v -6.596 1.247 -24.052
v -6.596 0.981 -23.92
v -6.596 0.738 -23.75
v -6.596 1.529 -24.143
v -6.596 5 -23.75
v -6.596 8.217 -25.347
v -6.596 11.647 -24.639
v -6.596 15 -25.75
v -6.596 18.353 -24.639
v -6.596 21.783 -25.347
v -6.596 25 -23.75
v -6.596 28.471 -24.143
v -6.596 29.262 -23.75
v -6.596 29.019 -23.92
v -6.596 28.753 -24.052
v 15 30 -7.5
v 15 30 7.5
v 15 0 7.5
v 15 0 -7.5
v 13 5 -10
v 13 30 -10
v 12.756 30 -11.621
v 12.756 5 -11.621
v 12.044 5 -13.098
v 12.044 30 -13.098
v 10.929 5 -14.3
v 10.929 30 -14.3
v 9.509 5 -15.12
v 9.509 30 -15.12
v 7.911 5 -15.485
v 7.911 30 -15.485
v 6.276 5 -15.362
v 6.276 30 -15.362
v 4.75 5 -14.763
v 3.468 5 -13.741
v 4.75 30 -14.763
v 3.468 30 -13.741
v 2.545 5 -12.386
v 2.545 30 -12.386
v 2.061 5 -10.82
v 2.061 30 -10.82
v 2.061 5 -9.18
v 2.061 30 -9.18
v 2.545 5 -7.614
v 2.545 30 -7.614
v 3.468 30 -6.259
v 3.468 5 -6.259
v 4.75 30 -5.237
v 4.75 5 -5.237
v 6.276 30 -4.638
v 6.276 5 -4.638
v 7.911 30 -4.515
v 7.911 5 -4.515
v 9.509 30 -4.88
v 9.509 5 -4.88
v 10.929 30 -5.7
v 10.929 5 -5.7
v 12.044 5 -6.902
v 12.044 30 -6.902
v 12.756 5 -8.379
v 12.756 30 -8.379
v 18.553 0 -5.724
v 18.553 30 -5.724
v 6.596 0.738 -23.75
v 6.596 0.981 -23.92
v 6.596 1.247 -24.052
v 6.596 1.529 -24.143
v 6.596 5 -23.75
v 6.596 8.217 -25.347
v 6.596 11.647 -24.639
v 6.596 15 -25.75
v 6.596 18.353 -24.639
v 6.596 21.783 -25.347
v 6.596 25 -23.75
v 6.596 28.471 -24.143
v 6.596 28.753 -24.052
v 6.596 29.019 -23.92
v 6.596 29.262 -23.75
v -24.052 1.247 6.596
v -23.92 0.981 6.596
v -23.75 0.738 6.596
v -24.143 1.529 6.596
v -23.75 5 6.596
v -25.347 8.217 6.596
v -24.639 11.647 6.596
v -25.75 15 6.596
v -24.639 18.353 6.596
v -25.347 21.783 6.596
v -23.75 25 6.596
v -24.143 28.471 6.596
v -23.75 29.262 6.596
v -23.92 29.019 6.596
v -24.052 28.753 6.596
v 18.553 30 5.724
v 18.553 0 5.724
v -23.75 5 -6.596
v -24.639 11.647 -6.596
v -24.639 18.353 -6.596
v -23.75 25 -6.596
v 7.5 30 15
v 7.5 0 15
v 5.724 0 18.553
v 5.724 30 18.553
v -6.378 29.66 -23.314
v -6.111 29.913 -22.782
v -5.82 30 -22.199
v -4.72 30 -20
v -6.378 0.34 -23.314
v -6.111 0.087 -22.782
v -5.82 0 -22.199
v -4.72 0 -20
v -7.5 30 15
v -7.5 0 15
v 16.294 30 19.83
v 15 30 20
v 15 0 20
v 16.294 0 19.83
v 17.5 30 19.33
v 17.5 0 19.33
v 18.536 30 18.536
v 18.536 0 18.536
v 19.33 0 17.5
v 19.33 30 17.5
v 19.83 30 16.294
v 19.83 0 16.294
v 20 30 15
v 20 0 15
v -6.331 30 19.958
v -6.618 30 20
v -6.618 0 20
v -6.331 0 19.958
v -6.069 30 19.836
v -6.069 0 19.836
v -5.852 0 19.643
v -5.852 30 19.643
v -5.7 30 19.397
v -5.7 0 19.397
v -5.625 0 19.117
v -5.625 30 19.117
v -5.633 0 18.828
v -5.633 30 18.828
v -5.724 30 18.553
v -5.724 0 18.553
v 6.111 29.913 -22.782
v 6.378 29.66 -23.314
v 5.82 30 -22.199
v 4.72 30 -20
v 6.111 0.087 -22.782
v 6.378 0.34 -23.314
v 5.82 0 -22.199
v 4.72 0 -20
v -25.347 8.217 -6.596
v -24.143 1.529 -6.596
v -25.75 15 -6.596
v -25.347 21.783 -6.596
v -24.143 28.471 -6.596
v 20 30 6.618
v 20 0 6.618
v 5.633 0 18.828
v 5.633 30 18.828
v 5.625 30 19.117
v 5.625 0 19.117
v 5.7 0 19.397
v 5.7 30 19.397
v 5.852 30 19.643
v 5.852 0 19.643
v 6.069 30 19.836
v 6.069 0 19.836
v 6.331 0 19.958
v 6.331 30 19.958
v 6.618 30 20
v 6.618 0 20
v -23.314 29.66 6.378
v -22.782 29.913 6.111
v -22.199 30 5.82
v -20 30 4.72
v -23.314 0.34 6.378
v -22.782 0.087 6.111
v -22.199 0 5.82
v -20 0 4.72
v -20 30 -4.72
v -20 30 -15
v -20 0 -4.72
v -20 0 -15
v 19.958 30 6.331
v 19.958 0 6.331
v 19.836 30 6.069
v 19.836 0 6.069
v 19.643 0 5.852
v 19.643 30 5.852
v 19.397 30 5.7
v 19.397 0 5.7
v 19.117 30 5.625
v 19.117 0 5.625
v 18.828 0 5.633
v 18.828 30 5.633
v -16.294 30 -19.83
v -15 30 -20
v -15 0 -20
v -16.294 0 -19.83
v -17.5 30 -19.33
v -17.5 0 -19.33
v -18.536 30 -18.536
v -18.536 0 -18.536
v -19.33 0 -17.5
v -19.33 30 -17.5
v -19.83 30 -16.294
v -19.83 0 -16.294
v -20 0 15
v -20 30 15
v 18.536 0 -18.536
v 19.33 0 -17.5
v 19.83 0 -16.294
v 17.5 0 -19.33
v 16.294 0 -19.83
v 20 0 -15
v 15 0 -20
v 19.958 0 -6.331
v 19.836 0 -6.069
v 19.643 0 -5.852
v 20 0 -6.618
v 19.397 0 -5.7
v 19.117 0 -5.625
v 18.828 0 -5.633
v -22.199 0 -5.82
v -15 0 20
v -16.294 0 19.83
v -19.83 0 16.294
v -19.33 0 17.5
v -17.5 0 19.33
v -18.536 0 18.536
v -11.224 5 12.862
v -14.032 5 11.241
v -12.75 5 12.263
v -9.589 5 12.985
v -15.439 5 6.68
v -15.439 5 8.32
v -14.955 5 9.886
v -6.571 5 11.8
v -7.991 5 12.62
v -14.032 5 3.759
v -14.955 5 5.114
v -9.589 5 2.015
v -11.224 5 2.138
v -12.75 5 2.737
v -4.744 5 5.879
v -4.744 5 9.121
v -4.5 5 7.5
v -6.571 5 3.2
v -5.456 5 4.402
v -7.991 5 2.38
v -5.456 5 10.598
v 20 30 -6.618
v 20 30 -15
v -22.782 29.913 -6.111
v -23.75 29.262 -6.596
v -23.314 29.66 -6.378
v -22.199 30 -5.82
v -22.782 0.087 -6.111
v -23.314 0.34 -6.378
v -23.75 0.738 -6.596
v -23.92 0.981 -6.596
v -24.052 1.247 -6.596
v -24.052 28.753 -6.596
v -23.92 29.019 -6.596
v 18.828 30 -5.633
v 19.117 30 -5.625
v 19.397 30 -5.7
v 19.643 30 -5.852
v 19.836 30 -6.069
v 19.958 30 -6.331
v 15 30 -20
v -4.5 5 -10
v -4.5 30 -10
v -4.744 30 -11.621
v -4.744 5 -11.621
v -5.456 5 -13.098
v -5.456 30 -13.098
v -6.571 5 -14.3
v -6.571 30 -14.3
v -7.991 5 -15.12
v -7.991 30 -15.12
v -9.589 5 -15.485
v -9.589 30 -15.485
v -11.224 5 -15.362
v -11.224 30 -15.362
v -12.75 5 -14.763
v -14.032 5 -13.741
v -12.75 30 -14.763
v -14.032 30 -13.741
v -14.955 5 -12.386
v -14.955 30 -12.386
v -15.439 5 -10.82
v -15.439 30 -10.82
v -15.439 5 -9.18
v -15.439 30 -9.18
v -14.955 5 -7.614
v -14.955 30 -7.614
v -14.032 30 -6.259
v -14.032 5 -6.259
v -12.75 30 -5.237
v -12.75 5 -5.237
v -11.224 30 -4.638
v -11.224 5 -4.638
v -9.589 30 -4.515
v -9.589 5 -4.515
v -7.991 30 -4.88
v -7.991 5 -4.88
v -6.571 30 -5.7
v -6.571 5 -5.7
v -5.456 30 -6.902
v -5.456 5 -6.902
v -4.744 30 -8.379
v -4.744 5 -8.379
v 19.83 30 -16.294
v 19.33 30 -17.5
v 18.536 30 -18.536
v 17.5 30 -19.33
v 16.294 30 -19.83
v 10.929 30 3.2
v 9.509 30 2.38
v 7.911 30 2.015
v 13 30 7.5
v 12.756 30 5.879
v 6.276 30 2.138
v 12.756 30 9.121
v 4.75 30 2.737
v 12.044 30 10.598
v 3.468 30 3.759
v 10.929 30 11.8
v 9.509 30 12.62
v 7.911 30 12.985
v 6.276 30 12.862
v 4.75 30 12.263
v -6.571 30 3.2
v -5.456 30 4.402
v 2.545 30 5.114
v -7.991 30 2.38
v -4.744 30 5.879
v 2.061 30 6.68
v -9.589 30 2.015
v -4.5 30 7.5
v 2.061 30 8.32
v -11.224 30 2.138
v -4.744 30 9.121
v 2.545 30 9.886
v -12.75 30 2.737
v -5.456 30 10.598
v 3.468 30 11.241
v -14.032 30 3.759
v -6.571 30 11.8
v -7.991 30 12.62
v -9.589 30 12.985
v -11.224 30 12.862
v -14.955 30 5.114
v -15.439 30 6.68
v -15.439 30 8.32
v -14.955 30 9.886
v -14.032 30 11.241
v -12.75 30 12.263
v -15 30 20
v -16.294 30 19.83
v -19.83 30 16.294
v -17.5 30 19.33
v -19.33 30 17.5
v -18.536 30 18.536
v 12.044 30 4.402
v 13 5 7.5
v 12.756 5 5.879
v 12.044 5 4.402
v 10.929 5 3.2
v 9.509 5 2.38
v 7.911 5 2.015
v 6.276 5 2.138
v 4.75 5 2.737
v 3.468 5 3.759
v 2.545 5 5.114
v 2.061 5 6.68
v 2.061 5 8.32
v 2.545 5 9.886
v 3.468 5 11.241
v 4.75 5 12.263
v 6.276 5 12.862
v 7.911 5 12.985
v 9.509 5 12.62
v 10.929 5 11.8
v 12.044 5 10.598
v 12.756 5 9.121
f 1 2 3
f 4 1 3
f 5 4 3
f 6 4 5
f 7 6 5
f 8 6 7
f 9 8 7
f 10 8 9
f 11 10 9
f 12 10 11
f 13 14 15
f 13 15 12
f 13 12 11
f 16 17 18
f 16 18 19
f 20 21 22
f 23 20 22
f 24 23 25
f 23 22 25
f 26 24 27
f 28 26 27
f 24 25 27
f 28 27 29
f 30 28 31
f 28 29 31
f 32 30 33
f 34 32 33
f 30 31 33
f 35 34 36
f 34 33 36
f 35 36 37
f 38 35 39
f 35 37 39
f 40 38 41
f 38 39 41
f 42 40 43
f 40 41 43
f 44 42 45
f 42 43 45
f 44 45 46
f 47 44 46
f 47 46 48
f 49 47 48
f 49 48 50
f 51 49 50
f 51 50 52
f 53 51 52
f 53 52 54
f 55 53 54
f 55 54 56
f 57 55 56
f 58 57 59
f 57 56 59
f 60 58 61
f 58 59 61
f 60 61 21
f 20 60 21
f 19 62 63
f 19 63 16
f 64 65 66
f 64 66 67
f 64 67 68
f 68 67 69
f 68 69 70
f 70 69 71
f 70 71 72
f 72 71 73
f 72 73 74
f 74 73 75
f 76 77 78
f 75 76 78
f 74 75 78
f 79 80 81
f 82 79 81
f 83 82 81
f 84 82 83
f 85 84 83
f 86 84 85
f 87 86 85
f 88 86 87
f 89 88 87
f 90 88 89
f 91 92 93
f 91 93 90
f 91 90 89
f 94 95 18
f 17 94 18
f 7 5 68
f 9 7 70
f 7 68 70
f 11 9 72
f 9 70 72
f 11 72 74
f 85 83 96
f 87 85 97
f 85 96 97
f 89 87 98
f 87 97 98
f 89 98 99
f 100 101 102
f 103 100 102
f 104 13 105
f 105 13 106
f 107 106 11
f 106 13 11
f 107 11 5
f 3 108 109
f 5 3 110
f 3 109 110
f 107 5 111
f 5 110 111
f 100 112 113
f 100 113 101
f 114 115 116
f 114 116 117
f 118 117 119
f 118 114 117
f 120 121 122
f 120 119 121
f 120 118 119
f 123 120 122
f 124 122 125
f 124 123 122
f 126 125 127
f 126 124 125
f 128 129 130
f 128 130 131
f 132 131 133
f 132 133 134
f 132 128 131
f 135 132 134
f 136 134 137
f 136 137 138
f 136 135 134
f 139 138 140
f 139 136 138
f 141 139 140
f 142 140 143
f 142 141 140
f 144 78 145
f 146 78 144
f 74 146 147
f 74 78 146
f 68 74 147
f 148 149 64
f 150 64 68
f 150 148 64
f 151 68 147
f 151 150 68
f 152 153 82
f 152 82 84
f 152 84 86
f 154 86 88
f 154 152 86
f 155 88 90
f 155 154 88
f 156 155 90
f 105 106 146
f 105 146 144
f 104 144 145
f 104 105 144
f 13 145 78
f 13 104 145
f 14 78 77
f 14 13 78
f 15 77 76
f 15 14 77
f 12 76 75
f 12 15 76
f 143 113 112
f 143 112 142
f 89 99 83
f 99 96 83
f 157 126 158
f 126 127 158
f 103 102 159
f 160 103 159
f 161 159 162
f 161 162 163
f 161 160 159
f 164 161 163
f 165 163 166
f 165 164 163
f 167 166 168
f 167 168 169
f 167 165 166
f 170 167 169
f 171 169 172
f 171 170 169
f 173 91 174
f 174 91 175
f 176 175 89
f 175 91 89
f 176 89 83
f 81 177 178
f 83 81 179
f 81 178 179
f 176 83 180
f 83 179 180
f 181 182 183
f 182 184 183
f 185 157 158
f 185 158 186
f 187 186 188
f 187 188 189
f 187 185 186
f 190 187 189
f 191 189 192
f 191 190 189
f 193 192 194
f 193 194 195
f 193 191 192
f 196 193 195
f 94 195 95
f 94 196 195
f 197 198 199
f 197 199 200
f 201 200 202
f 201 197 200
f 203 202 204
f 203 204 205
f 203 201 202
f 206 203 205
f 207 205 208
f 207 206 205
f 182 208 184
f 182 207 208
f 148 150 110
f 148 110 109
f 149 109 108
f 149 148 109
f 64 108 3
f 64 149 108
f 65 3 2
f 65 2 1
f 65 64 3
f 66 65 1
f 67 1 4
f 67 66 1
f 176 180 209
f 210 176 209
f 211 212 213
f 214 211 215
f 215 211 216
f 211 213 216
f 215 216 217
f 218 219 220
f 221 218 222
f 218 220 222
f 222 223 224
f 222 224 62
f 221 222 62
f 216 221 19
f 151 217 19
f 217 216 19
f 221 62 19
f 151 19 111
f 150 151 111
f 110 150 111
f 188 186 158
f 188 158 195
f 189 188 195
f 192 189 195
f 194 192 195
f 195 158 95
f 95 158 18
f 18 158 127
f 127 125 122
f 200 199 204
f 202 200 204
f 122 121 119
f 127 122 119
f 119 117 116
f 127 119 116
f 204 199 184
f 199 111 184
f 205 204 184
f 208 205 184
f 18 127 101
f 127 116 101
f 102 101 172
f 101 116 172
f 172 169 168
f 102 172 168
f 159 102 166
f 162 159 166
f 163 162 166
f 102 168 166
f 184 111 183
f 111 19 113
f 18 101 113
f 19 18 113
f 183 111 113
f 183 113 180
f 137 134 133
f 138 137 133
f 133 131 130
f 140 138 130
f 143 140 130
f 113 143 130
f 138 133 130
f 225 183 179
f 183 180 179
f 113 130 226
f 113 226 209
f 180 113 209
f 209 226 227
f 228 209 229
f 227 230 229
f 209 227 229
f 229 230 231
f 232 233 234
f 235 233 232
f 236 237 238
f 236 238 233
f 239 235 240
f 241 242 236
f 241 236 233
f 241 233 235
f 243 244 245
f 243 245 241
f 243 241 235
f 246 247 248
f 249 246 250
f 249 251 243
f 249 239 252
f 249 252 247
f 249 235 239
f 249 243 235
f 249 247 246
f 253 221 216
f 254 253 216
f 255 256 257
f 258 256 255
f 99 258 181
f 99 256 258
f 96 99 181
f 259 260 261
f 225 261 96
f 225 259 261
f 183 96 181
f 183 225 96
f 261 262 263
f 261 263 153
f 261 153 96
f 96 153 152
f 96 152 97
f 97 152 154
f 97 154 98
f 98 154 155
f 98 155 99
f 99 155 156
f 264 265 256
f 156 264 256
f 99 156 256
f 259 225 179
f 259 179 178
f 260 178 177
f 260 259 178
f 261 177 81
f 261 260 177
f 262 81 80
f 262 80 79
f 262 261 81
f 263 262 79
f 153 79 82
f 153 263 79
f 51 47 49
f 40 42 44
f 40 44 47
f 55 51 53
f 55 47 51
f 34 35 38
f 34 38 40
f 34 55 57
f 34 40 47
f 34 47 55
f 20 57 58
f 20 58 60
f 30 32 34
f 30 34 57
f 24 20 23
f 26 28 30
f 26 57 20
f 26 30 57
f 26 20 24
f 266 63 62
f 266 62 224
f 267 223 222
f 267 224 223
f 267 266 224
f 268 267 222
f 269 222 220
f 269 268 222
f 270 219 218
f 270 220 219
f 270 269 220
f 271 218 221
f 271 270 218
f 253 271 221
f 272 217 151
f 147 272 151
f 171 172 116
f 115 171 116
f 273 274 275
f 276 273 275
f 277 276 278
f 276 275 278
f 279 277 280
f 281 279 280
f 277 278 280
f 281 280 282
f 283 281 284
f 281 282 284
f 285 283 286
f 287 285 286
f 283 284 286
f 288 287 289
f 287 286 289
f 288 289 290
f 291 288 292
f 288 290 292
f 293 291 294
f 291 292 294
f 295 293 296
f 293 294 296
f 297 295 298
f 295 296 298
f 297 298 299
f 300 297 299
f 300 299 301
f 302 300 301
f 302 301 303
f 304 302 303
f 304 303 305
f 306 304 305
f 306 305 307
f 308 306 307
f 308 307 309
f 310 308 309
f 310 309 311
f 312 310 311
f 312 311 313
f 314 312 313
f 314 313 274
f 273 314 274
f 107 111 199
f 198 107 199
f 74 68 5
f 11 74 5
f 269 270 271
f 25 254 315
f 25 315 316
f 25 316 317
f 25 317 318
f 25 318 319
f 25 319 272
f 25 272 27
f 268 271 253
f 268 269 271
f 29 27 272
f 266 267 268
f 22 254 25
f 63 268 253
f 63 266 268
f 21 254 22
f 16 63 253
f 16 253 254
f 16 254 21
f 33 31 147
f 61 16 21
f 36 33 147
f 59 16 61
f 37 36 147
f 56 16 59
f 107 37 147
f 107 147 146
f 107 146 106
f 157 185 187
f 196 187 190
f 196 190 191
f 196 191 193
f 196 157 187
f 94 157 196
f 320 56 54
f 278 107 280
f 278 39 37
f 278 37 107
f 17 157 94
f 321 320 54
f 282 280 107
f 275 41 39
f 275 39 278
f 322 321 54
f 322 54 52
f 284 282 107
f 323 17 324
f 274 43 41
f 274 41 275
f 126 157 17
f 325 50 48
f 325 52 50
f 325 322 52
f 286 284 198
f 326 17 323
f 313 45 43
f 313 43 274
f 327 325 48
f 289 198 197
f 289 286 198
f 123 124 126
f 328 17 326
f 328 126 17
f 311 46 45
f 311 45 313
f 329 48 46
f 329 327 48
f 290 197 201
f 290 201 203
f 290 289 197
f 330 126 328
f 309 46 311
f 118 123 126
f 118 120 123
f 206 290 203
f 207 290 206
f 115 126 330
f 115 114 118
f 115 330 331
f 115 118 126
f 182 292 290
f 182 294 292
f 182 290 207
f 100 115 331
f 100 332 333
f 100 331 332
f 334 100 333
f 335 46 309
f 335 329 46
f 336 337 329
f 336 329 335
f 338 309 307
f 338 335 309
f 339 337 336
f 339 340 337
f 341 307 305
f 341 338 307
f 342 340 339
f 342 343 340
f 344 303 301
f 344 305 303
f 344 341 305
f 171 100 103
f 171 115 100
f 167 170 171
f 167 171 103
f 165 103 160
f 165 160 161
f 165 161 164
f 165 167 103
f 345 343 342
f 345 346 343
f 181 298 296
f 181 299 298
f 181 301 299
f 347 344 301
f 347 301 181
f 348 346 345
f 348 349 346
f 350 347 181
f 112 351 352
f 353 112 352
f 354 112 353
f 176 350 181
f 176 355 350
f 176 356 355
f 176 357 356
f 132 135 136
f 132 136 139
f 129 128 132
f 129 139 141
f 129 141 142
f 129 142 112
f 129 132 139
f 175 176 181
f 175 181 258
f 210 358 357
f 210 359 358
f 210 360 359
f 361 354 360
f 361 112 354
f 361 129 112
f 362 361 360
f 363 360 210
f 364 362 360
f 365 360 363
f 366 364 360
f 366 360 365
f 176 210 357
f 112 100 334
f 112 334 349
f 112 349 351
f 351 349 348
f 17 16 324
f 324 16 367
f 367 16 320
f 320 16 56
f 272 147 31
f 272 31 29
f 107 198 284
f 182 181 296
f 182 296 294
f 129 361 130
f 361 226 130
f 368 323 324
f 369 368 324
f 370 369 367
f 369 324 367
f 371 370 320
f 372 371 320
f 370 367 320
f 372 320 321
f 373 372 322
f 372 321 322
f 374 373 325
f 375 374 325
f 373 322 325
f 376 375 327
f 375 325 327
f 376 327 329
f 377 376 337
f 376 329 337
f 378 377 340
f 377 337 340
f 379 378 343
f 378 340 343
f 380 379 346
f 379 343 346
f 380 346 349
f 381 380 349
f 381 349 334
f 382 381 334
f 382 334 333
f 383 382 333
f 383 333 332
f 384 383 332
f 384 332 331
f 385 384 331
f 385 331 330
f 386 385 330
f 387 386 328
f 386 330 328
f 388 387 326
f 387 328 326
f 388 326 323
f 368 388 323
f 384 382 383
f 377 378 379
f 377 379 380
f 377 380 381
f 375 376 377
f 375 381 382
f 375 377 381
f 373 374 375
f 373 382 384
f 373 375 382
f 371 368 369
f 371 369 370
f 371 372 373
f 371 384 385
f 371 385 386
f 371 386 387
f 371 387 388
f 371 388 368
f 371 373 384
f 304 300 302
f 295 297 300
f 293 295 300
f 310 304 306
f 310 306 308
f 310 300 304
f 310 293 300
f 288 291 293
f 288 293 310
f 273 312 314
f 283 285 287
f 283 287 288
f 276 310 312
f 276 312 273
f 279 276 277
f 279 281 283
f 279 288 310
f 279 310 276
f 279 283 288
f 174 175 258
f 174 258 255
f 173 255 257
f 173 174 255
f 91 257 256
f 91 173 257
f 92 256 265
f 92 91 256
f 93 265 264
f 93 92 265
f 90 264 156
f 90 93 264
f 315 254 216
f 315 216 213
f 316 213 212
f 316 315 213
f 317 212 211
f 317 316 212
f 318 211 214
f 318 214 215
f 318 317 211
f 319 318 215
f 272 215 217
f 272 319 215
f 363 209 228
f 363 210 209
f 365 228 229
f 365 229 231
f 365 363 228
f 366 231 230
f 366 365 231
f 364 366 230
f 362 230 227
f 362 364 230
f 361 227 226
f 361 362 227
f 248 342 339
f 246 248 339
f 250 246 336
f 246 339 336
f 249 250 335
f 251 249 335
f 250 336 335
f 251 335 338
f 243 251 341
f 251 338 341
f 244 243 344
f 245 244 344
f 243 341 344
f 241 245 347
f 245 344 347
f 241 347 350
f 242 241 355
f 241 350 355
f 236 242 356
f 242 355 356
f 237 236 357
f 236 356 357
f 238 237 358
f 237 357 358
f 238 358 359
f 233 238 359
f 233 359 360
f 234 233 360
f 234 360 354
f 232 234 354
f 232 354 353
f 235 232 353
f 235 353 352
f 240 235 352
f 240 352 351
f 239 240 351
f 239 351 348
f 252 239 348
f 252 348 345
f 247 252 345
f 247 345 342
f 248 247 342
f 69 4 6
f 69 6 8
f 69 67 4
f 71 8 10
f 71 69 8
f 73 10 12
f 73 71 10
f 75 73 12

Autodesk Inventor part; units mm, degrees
ref_plane "YZ Plane" through (0, 0, 0) normal (1, 0, 0) x (0, 1, 0)
ref_plane "XZ Plane" through (0, 0, 0) normal (0, 1, 0) x (-1, 0, 0)
sketch "Sketch1" plane through (0, 0, 0) normal (0, 1, 0) x (-1, 0, 0)
  line L0 (-20, -20) -> (20, -20)
  line L1 (20, -20) -> (20, 20)
  line L2 (20, 20) -> (-20, 20)
  line L3 (-20, 20) -> (-20, -20)
  line L4 (-20, -20) -> (20, 20) construction
  line L5 (20, -20) -> (-20, 20) construction
  line L6 (20, 0) -> (25, 0)
  line L7 (25, 0) -> (25, 7.5)
  line L8 (20, 0) -> (20, 5)
  line L9 (20, 5) -> (25, 7.5)
  line L10 (25, 0) -> (25, -7.5)
  line L11 (20, 0) -> (20, -5)
  line L12 (20, -5) -> (25, -7.5)
  line L13 (0, -20) -> (5, -20)
  line L14 (0, -20) -> (-5, -20)
  line L15 (0, -20) -> (0, -25)
  line L16 (0, -25) -> (7.5, -25)
  line L17 (7.5, -25) -> (5, -20)
  line L18 (0, -25) -> (-7.5, -25)
  line L19 (-7.5, -25) -> (-5, -20)
  line L20 (-15, 0) -> (-15, -7.5)
  line L21 (-20, -5) -> (-15, -7.5)
  line L22 (-20, 0) -> (-15, 0)
  line L23 (-15, 0) -> (-15, 7.5)
  line L24 (-20, 5) -> (-15, 7.5)
  line L25 (-7.5, 15) -> (-5, 20)
  line L26 (0, 15) -> (-7.5, 15)
  line L27 (0, 20) -> (0, 15)
  line L28 (7.5, 15) -> (5, 20)
  line L29 (0, 15) -> (7.5, 15)
  line L30 (0, -24.75) -> (7.0955, -24.75)
  line L31 (7.0955, -24.75) -> (4.8455, -20.25)
  line L32 (4.8455, -20.25) -> (0, -20.25)
  line L33 (0, -24.75) -> (-7.0955, -24.75)
  line L34 (-7.0955, -24.75) -> (-4.8455, -20.25)
  line L35 (-4.8455, -20.25) -> (0, -20.25)
  line L36 (7.0955, -24.75) -> (4.7205, -20)
  line L37 (-7.0955, -24.75) -> (-4.7205, -20)
  line L38 (24.75, 0) -> (24.75, -7.0955)
  line L39 (24.75, -7.0955) -> (20.25, -4.8455)
  line L40 (20.25, -4.8455) -> (20.25, 0)
  line L41 (24.75, 0) -> (24.75, 7.0955)
  line L42 (24.75, 7.0955) -> (20.25, 4.8455)
  line L43 (20.25, 4.8455) -> (20.25, 0)
  line L44 (24.75, -7.0955) -> (20, -4.7205)
  line L45 (24.75, 7.0955) -> (20, 4.7205)
  line L46 (25, 0) -> (23.75, 0)
  line L47 (23.75, 0) -> (23.75, -6.875)
  line L48 (23.75, 0) -> (23.75, 6.875)
  line L49 (0, -25) -> (0, -23.75)
  line L50 (0, -23.75) -> (-6.875, -23.75)
  line L51 (0, -23.75) -> (6.875, -23.75)
  point P0 (0, 0)
  point P1 (-4.7205, -20)
  point P2 (4.7205, -20)
  point P3 (20, -4.7205)
  point P4 (20, 4.7205)
  point P5 (23.75, -6.5955)
  point P6 (23.75, 6.5955)
  point P7 (-6.5955, -23.75)
  point P8 (6.5955, -23.75)
  dimension "d0" = 40
  dimension "d1" = 40
  dimension "d2" = 5
  dimension "d3" = 7.5
  dimension "d4" = 5
  dimension "d5" = 7.5
  dimension "d6" = 5
  dimension "d7" = 5
  dimension "d8" = 5
  dimension "d9" = 5
  dimension "d10" = 7.5
  dimension "d11" = 7.5
  dimension "d14" = 40
  dimension "d21" = 40
  dimension "d43" = 0.25
  dimension "d44" = 0.25
  dimension "d45" = 0.25
  dimension "d46" = 0.25
  dimension "d56" = 1.25
  dimension "d57" = 1.25
extrude "Extrusion1" add sketch "Sketch1" along normal blind 30 contours L3 L21 L20 L23 L24 L2 L25 L26 L29 L28 L1 L0 | L0 L15 L35 L37 | L0 L36 L32 L15 | L35 L15 L50 L34 | L32 L31 L51 L15 | L1 L6 L40 L44 | L1 L45 L43 L6 | L40 L6 L47 L39 | L43 L42 L48 L6
sketch "Sketch2" plane through (0, 30, 0) normal (0, 1, 0) x (1, 0, 0)
  line L0 (-4.7205, 20) -> (-20, 20) projected
  line L1 (-20, 20) -> (0, 20)
  line L2 (0, 20) -> (0, 0)
  circle A0 centre (-10, 10) radius 5.5
  circle A1 centre (7.5, 10) radius 5.5
  circle A2 centre (-10, -7.5) radius 5.5
  circle A3 centre (7.5, -7.5) radius 5.5
  point P0 (-5, 20)
  dimension "d30" = 11
  dimension "d33" = 17.5
  dimension "d36" = 17.5
extrude "Extrusion2" cut sketch "Sketch2" against normal blind 25
fillet "Fillet1" radius 1 4 edges at (20, 15, -5) (20, 15, 5) (5, 15, 20) (-5, 15, 20)
fillet "Fillet2" radius 5 4 edges at (20, 15, -20) (20, 15, 20) (-20, 15, 20) (-20, 15, -20)
ref_plane "Work Plane1" through (6.5955, 0, -23.75) normal (-1, 0, 0) x (0, 1, 0)
sketch "Sketch3" plane through (6.5955, 0, -23.75) normal (-1, 0, 0) x (0, 1, 0)
  line L0 (0, -3.75) -> (30, -3.75) projected
  line L1 (15, -3.75) -> (15, 2)
  line L2 (0, 0) -> (5, 0)
  line L3 (15, 2) -> (15, -0.25)
  line L4 (15, 2) -> (15, 0.875)
  line L5 (30, -3.75) -> (30, 0) projected
  line L6 (25, 0) -> (30, 0)
  line L7 (0, 0) -> (30, 0) projected
  arc A0 (30, 0) -> (0, 0) centre (15, -55.25) ccw
  line L8 (15, 2) -> (15, 1)
  arc A1 (25, 0) -> (5, 0) centre (15, -49.5) ccw
  point P0 (0, -23.75)
  dimension "d48" = 5.75
  dimension "d55" = 5
  dimension "d60" = 1
  dimension "d61" = 5
extrude "Extrusion3" add sketch "Sketch3" along normal blind 13.191 contours L6 A1 L1 A0 | L1 A1 L2 A0
pattern_circular "Circular Pattern1" count 2 over 90 about axis through (0, 30, 0) along (0, 1, 0) of "Extrusion3"
fillet "Fillet3" radius 2 4 edges at (0, 30, -23.75) (0, 0, -23.75) (-23.75, 30, 0) (-23.75, 0, 0)
sketch "Sketch5" plane through (-6.5955, 0, -23.75) normal (-1, 0, 0) x (0, 0, 1)
  point P0 (23.75, 0)
properties part number "4x11mm_3DPrint"
